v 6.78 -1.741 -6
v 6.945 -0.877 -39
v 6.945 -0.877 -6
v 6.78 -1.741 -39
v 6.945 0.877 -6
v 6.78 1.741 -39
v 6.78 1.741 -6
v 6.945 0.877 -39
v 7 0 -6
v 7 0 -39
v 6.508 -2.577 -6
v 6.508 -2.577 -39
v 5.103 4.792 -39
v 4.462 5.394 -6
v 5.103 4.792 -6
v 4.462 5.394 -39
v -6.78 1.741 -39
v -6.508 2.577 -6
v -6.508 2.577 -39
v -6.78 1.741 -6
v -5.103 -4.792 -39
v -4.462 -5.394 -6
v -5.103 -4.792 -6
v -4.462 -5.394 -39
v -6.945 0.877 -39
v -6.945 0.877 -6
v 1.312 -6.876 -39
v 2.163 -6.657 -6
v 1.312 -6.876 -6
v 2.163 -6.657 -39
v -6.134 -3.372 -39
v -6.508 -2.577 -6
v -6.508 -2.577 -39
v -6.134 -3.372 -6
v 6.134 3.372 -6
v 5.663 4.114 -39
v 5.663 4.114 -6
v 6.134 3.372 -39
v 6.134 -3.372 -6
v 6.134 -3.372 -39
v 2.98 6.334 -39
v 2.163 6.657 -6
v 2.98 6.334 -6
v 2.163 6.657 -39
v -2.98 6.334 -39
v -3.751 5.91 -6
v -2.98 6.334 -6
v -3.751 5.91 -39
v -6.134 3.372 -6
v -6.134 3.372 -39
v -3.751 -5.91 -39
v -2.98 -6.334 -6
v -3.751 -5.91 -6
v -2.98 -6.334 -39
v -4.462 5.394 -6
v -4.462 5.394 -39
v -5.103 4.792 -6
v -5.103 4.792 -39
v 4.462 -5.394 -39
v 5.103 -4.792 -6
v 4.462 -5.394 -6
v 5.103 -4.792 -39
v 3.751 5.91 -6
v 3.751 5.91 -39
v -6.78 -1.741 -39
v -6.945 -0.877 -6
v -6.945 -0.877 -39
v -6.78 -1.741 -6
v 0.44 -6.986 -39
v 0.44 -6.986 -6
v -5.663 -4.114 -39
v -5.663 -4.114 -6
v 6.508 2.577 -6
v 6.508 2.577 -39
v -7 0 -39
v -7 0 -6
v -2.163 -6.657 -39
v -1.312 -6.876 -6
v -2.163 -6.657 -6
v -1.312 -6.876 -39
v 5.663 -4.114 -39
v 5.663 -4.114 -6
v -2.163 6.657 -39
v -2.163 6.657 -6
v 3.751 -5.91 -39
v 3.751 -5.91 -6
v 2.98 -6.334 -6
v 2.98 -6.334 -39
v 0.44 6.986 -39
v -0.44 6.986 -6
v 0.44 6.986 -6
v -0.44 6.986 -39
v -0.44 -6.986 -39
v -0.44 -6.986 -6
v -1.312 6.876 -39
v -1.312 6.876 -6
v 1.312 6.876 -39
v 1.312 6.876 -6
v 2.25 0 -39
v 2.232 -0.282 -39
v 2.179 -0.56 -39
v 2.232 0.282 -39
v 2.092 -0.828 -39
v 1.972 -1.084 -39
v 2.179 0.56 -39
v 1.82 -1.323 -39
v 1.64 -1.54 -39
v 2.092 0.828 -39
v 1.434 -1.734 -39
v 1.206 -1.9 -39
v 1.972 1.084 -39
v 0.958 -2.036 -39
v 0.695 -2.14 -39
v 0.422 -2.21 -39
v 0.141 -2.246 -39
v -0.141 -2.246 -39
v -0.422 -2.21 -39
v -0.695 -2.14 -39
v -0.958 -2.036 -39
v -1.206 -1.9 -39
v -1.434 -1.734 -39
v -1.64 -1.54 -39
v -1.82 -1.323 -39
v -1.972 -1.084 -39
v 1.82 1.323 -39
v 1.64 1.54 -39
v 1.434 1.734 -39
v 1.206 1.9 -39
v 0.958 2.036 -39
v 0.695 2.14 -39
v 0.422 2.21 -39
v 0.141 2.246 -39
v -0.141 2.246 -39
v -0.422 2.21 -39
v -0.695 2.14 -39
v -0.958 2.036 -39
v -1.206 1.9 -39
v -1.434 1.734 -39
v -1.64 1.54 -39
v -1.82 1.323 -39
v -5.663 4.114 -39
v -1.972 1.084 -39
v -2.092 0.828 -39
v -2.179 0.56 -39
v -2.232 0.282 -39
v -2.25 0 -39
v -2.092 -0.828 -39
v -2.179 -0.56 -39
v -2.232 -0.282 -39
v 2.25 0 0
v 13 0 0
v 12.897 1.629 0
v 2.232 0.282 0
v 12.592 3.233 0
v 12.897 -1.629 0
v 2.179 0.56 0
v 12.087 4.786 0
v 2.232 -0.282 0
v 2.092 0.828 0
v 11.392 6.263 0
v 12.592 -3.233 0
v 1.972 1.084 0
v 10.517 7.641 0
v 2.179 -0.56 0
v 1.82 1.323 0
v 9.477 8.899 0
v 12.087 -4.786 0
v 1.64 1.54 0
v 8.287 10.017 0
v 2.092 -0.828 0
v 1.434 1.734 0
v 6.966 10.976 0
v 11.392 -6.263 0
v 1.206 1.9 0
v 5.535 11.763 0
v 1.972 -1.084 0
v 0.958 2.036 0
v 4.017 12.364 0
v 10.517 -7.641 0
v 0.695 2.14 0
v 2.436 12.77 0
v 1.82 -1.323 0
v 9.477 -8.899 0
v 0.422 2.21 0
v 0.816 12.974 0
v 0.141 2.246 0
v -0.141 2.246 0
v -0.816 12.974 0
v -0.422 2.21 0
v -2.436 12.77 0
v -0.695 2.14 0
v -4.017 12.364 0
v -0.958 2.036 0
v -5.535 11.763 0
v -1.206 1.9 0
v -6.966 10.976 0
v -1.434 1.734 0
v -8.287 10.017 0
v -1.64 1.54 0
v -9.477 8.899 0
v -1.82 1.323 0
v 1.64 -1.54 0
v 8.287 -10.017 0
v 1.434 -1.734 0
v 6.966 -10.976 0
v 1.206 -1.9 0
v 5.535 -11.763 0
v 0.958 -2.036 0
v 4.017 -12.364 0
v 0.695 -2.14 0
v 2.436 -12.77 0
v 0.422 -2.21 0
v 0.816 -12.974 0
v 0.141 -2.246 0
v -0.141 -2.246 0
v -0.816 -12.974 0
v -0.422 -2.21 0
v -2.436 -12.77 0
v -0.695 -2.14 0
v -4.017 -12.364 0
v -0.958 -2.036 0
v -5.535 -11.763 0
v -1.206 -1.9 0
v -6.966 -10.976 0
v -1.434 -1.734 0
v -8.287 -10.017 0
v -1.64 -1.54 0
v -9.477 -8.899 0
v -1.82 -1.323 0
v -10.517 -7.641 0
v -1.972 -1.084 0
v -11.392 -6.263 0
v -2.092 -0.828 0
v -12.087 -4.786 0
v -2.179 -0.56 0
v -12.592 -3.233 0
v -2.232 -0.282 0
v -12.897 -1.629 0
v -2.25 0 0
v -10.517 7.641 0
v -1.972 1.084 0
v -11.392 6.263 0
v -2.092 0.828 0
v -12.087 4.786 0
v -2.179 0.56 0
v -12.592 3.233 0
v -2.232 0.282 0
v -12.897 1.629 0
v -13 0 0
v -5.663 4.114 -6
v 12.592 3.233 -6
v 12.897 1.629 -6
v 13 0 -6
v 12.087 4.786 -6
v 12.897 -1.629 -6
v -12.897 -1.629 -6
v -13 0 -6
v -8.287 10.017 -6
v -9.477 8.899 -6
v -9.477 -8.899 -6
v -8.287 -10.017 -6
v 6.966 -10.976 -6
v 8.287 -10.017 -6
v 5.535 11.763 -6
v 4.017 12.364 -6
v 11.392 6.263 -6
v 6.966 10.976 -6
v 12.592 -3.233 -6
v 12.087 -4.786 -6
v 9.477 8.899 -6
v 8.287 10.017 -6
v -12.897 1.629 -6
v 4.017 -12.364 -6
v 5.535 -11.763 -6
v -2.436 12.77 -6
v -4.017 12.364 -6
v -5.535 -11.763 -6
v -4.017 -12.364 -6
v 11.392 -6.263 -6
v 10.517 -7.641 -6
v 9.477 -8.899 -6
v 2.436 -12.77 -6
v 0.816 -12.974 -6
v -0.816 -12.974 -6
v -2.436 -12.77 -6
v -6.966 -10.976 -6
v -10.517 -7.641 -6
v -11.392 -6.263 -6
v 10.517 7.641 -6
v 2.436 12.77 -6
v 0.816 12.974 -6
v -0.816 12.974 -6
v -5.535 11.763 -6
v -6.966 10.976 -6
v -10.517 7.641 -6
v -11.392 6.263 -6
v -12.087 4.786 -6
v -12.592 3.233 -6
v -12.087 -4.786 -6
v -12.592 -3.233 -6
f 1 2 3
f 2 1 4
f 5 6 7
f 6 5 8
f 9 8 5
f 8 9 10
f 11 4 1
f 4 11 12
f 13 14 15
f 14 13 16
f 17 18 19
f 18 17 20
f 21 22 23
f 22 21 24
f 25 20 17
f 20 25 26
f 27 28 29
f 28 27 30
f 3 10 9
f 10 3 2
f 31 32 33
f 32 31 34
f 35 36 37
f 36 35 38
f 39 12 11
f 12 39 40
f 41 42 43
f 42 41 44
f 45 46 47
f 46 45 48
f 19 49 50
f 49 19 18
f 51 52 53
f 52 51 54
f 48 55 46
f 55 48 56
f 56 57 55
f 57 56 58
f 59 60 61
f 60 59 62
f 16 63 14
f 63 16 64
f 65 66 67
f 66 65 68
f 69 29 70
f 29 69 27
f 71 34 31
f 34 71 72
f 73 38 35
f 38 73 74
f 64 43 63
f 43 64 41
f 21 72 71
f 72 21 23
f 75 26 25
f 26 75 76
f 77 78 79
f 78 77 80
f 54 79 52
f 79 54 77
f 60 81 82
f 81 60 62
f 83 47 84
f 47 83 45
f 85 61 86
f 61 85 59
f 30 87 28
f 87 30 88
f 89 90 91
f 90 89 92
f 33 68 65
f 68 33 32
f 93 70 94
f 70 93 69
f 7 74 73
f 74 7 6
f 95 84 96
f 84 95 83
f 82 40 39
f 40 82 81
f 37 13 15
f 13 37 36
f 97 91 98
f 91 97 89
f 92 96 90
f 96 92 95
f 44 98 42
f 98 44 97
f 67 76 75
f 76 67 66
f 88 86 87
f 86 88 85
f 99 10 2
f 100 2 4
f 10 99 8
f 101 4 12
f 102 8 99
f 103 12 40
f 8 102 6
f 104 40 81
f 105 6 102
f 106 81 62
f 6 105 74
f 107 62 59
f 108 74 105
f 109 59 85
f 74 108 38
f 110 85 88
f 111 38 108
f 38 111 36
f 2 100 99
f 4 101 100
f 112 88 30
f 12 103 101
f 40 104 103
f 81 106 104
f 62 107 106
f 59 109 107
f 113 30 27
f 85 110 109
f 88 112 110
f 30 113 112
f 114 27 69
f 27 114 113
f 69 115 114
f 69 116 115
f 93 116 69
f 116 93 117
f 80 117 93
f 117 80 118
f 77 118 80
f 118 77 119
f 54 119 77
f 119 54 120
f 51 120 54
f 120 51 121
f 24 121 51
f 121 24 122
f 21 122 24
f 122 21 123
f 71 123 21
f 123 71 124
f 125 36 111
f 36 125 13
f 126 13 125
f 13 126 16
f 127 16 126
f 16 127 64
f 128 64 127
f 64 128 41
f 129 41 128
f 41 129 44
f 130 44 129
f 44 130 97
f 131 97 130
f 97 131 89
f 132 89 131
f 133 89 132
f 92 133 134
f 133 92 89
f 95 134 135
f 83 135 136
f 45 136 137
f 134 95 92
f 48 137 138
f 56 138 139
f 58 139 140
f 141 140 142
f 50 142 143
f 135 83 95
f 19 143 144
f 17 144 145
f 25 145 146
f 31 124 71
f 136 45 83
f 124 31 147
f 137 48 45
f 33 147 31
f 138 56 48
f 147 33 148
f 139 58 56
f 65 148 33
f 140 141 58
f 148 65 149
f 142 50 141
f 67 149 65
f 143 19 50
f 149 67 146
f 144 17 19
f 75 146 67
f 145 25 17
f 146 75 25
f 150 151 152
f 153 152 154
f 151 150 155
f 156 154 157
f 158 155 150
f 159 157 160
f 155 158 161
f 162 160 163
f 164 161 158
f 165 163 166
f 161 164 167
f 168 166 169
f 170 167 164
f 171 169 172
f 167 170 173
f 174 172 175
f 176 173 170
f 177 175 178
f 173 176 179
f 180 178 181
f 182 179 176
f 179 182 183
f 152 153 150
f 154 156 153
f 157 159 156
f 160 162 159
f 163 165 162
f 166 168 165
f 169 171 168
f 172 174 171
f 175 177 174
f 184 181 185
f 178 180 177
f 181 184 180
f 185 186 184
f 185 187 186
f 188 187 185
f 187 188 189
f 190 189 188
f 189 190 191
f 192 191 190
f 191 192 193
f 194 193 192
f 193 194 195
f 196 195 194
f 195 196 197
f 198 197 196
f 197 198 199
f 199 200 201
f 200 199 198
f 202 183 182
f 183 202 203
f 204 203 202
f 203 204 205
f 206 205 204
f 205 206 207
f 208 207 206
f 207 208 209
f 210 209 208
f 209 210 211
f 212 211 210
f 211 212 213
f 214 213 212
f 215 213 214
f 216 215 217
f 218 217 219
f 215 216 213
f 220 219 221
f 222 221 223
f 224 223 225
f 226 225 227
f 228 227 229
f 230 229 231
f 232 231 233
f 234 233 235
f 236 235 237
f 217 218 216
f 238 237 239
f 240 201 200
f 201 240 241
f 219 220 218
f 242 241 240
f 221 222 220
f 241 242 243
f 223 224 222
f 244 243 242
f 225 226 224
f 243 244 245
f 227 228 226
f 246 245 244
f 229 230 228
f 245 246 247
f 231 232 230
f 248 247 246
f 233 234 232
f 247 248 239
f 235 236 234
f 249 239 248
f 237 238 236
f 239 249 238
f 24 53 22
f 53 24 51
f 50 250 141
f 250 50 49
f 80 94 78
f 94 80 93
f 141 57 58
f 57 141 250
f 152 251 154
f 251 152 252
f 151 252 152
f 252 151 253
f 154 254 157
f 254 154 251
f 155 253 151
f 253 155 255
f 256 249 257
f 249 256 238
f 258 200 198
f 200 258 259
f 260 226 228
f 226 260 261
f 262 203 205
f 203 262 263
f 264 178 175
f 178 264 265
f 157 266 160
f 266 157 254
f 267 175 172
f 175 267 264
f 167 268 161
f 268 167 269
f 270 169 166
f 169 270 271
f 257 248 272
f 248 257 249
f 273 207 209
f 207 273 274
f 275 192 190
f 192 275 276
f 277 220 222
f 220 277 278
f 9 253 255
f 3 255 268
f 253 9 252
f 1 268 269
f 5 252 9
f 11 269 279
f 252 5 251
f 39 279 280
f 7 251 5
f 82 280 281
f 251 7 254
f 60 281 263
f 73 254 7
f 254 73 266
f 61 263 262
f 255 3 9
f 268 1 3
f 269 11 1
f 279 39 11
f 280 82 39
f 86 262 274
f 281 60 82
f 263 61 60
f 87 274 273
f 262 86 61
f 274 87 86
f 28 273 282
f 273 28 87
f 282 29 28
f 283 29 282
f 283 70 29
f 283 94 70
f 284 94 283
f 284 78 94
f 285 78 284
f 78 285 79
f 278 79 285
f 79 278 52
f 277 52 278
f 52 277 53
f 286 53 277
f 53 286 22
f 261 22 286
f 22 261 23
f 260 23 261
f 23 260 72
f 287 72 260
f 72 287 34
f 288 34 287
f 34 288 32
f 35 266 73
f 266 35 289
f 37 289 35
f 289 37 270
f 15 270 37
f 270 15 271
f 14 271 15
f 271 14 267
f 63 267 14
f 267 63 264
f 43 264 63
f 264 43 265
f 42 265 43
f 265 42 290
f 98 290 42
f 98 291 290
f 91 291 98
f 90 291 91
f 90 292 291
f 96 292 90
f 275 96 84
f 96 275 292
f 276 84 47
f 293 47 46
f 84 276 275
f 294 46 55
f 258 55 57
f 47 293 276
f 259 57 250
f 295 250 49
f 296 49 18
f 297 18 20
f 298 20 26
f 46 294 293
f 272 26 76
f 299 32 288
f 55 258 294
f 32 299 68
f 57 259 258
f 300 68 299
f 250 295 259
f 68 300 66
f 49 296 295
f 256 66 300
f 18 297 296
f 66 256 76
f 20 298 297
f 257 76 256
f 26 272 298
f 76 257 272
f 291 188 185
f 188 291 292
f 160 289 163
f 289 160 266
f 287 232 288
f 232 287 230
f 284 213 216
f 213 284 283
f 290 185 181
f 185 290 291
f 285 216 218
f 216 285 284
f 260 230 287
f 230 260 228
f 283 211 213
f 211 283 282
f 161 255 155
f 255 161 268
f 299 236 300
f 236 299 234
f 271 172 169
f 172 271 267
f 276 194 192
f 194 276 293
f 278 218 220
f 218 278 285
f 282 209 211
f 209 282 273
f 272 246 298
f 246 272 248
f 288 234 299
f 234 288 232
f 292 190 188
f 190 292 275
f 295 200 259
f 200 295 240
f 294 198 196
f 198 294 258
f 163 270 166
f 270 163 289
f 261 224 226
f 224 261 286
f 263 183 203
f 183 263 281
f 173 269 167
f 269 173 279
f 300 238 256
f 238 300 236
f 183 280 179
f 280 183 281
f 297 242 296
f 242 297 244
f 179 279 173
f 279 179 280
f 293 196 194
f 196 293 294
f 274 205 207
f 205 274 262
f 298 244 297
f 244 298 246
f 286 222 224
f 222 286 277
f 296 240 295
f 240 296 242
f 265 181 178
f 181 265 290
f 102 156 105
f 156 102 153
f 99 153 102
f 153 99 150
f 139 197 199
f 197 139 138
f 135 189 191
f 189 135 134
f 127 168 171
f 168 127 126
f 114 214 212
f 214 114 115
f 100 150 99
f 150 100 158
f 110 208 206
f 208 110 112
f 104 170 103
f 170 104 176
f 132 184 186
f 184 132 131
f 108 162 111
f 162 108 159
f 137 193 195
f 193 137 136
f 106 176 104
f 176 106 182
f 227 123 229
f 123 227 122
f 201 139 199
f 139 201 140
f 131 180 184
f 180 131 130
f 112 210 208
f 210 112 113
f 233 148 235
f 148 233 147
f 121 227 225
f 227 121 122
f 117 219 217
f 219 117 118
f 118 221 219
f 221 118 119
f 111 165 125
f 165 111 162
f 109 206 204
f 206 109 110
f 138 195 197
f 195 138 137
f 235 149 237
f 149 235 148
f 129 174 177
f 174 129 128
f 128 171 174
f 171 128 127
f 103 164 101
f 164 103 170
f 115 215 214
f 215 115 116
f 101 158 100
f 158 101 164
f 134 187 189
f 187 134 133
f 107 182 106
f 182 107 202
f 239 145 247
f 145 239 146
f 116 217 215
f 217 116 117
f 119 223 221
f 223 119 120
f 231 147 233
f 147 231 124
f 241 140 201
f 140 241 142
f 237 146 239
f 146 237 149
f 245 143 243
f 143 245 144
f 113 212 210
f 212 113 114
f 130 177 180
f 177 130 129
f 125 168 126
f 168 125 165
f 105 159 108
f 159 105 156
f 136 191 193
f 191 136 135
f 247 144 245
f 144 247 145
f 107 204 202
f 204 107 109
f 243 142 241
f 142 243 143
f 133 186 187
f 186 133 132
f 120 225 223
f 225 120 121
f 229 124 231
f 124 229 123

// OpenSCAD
$fn = 50;


difference() {
	union() {
		translate(v = [0, 0, -39.0000000000]) {
			cylinder(h = 39, r = 7.0000000000);
		}
		translate(v = [0, 0, -6.0000000000]) {
			cylinder(h = 6, r = 13.0000000000);
		}
	}
	union() {
		#translate(v = [0, 0, -39]) {
			cylinder(h = 39, r = 2.2500000000);
		}
	}
}
